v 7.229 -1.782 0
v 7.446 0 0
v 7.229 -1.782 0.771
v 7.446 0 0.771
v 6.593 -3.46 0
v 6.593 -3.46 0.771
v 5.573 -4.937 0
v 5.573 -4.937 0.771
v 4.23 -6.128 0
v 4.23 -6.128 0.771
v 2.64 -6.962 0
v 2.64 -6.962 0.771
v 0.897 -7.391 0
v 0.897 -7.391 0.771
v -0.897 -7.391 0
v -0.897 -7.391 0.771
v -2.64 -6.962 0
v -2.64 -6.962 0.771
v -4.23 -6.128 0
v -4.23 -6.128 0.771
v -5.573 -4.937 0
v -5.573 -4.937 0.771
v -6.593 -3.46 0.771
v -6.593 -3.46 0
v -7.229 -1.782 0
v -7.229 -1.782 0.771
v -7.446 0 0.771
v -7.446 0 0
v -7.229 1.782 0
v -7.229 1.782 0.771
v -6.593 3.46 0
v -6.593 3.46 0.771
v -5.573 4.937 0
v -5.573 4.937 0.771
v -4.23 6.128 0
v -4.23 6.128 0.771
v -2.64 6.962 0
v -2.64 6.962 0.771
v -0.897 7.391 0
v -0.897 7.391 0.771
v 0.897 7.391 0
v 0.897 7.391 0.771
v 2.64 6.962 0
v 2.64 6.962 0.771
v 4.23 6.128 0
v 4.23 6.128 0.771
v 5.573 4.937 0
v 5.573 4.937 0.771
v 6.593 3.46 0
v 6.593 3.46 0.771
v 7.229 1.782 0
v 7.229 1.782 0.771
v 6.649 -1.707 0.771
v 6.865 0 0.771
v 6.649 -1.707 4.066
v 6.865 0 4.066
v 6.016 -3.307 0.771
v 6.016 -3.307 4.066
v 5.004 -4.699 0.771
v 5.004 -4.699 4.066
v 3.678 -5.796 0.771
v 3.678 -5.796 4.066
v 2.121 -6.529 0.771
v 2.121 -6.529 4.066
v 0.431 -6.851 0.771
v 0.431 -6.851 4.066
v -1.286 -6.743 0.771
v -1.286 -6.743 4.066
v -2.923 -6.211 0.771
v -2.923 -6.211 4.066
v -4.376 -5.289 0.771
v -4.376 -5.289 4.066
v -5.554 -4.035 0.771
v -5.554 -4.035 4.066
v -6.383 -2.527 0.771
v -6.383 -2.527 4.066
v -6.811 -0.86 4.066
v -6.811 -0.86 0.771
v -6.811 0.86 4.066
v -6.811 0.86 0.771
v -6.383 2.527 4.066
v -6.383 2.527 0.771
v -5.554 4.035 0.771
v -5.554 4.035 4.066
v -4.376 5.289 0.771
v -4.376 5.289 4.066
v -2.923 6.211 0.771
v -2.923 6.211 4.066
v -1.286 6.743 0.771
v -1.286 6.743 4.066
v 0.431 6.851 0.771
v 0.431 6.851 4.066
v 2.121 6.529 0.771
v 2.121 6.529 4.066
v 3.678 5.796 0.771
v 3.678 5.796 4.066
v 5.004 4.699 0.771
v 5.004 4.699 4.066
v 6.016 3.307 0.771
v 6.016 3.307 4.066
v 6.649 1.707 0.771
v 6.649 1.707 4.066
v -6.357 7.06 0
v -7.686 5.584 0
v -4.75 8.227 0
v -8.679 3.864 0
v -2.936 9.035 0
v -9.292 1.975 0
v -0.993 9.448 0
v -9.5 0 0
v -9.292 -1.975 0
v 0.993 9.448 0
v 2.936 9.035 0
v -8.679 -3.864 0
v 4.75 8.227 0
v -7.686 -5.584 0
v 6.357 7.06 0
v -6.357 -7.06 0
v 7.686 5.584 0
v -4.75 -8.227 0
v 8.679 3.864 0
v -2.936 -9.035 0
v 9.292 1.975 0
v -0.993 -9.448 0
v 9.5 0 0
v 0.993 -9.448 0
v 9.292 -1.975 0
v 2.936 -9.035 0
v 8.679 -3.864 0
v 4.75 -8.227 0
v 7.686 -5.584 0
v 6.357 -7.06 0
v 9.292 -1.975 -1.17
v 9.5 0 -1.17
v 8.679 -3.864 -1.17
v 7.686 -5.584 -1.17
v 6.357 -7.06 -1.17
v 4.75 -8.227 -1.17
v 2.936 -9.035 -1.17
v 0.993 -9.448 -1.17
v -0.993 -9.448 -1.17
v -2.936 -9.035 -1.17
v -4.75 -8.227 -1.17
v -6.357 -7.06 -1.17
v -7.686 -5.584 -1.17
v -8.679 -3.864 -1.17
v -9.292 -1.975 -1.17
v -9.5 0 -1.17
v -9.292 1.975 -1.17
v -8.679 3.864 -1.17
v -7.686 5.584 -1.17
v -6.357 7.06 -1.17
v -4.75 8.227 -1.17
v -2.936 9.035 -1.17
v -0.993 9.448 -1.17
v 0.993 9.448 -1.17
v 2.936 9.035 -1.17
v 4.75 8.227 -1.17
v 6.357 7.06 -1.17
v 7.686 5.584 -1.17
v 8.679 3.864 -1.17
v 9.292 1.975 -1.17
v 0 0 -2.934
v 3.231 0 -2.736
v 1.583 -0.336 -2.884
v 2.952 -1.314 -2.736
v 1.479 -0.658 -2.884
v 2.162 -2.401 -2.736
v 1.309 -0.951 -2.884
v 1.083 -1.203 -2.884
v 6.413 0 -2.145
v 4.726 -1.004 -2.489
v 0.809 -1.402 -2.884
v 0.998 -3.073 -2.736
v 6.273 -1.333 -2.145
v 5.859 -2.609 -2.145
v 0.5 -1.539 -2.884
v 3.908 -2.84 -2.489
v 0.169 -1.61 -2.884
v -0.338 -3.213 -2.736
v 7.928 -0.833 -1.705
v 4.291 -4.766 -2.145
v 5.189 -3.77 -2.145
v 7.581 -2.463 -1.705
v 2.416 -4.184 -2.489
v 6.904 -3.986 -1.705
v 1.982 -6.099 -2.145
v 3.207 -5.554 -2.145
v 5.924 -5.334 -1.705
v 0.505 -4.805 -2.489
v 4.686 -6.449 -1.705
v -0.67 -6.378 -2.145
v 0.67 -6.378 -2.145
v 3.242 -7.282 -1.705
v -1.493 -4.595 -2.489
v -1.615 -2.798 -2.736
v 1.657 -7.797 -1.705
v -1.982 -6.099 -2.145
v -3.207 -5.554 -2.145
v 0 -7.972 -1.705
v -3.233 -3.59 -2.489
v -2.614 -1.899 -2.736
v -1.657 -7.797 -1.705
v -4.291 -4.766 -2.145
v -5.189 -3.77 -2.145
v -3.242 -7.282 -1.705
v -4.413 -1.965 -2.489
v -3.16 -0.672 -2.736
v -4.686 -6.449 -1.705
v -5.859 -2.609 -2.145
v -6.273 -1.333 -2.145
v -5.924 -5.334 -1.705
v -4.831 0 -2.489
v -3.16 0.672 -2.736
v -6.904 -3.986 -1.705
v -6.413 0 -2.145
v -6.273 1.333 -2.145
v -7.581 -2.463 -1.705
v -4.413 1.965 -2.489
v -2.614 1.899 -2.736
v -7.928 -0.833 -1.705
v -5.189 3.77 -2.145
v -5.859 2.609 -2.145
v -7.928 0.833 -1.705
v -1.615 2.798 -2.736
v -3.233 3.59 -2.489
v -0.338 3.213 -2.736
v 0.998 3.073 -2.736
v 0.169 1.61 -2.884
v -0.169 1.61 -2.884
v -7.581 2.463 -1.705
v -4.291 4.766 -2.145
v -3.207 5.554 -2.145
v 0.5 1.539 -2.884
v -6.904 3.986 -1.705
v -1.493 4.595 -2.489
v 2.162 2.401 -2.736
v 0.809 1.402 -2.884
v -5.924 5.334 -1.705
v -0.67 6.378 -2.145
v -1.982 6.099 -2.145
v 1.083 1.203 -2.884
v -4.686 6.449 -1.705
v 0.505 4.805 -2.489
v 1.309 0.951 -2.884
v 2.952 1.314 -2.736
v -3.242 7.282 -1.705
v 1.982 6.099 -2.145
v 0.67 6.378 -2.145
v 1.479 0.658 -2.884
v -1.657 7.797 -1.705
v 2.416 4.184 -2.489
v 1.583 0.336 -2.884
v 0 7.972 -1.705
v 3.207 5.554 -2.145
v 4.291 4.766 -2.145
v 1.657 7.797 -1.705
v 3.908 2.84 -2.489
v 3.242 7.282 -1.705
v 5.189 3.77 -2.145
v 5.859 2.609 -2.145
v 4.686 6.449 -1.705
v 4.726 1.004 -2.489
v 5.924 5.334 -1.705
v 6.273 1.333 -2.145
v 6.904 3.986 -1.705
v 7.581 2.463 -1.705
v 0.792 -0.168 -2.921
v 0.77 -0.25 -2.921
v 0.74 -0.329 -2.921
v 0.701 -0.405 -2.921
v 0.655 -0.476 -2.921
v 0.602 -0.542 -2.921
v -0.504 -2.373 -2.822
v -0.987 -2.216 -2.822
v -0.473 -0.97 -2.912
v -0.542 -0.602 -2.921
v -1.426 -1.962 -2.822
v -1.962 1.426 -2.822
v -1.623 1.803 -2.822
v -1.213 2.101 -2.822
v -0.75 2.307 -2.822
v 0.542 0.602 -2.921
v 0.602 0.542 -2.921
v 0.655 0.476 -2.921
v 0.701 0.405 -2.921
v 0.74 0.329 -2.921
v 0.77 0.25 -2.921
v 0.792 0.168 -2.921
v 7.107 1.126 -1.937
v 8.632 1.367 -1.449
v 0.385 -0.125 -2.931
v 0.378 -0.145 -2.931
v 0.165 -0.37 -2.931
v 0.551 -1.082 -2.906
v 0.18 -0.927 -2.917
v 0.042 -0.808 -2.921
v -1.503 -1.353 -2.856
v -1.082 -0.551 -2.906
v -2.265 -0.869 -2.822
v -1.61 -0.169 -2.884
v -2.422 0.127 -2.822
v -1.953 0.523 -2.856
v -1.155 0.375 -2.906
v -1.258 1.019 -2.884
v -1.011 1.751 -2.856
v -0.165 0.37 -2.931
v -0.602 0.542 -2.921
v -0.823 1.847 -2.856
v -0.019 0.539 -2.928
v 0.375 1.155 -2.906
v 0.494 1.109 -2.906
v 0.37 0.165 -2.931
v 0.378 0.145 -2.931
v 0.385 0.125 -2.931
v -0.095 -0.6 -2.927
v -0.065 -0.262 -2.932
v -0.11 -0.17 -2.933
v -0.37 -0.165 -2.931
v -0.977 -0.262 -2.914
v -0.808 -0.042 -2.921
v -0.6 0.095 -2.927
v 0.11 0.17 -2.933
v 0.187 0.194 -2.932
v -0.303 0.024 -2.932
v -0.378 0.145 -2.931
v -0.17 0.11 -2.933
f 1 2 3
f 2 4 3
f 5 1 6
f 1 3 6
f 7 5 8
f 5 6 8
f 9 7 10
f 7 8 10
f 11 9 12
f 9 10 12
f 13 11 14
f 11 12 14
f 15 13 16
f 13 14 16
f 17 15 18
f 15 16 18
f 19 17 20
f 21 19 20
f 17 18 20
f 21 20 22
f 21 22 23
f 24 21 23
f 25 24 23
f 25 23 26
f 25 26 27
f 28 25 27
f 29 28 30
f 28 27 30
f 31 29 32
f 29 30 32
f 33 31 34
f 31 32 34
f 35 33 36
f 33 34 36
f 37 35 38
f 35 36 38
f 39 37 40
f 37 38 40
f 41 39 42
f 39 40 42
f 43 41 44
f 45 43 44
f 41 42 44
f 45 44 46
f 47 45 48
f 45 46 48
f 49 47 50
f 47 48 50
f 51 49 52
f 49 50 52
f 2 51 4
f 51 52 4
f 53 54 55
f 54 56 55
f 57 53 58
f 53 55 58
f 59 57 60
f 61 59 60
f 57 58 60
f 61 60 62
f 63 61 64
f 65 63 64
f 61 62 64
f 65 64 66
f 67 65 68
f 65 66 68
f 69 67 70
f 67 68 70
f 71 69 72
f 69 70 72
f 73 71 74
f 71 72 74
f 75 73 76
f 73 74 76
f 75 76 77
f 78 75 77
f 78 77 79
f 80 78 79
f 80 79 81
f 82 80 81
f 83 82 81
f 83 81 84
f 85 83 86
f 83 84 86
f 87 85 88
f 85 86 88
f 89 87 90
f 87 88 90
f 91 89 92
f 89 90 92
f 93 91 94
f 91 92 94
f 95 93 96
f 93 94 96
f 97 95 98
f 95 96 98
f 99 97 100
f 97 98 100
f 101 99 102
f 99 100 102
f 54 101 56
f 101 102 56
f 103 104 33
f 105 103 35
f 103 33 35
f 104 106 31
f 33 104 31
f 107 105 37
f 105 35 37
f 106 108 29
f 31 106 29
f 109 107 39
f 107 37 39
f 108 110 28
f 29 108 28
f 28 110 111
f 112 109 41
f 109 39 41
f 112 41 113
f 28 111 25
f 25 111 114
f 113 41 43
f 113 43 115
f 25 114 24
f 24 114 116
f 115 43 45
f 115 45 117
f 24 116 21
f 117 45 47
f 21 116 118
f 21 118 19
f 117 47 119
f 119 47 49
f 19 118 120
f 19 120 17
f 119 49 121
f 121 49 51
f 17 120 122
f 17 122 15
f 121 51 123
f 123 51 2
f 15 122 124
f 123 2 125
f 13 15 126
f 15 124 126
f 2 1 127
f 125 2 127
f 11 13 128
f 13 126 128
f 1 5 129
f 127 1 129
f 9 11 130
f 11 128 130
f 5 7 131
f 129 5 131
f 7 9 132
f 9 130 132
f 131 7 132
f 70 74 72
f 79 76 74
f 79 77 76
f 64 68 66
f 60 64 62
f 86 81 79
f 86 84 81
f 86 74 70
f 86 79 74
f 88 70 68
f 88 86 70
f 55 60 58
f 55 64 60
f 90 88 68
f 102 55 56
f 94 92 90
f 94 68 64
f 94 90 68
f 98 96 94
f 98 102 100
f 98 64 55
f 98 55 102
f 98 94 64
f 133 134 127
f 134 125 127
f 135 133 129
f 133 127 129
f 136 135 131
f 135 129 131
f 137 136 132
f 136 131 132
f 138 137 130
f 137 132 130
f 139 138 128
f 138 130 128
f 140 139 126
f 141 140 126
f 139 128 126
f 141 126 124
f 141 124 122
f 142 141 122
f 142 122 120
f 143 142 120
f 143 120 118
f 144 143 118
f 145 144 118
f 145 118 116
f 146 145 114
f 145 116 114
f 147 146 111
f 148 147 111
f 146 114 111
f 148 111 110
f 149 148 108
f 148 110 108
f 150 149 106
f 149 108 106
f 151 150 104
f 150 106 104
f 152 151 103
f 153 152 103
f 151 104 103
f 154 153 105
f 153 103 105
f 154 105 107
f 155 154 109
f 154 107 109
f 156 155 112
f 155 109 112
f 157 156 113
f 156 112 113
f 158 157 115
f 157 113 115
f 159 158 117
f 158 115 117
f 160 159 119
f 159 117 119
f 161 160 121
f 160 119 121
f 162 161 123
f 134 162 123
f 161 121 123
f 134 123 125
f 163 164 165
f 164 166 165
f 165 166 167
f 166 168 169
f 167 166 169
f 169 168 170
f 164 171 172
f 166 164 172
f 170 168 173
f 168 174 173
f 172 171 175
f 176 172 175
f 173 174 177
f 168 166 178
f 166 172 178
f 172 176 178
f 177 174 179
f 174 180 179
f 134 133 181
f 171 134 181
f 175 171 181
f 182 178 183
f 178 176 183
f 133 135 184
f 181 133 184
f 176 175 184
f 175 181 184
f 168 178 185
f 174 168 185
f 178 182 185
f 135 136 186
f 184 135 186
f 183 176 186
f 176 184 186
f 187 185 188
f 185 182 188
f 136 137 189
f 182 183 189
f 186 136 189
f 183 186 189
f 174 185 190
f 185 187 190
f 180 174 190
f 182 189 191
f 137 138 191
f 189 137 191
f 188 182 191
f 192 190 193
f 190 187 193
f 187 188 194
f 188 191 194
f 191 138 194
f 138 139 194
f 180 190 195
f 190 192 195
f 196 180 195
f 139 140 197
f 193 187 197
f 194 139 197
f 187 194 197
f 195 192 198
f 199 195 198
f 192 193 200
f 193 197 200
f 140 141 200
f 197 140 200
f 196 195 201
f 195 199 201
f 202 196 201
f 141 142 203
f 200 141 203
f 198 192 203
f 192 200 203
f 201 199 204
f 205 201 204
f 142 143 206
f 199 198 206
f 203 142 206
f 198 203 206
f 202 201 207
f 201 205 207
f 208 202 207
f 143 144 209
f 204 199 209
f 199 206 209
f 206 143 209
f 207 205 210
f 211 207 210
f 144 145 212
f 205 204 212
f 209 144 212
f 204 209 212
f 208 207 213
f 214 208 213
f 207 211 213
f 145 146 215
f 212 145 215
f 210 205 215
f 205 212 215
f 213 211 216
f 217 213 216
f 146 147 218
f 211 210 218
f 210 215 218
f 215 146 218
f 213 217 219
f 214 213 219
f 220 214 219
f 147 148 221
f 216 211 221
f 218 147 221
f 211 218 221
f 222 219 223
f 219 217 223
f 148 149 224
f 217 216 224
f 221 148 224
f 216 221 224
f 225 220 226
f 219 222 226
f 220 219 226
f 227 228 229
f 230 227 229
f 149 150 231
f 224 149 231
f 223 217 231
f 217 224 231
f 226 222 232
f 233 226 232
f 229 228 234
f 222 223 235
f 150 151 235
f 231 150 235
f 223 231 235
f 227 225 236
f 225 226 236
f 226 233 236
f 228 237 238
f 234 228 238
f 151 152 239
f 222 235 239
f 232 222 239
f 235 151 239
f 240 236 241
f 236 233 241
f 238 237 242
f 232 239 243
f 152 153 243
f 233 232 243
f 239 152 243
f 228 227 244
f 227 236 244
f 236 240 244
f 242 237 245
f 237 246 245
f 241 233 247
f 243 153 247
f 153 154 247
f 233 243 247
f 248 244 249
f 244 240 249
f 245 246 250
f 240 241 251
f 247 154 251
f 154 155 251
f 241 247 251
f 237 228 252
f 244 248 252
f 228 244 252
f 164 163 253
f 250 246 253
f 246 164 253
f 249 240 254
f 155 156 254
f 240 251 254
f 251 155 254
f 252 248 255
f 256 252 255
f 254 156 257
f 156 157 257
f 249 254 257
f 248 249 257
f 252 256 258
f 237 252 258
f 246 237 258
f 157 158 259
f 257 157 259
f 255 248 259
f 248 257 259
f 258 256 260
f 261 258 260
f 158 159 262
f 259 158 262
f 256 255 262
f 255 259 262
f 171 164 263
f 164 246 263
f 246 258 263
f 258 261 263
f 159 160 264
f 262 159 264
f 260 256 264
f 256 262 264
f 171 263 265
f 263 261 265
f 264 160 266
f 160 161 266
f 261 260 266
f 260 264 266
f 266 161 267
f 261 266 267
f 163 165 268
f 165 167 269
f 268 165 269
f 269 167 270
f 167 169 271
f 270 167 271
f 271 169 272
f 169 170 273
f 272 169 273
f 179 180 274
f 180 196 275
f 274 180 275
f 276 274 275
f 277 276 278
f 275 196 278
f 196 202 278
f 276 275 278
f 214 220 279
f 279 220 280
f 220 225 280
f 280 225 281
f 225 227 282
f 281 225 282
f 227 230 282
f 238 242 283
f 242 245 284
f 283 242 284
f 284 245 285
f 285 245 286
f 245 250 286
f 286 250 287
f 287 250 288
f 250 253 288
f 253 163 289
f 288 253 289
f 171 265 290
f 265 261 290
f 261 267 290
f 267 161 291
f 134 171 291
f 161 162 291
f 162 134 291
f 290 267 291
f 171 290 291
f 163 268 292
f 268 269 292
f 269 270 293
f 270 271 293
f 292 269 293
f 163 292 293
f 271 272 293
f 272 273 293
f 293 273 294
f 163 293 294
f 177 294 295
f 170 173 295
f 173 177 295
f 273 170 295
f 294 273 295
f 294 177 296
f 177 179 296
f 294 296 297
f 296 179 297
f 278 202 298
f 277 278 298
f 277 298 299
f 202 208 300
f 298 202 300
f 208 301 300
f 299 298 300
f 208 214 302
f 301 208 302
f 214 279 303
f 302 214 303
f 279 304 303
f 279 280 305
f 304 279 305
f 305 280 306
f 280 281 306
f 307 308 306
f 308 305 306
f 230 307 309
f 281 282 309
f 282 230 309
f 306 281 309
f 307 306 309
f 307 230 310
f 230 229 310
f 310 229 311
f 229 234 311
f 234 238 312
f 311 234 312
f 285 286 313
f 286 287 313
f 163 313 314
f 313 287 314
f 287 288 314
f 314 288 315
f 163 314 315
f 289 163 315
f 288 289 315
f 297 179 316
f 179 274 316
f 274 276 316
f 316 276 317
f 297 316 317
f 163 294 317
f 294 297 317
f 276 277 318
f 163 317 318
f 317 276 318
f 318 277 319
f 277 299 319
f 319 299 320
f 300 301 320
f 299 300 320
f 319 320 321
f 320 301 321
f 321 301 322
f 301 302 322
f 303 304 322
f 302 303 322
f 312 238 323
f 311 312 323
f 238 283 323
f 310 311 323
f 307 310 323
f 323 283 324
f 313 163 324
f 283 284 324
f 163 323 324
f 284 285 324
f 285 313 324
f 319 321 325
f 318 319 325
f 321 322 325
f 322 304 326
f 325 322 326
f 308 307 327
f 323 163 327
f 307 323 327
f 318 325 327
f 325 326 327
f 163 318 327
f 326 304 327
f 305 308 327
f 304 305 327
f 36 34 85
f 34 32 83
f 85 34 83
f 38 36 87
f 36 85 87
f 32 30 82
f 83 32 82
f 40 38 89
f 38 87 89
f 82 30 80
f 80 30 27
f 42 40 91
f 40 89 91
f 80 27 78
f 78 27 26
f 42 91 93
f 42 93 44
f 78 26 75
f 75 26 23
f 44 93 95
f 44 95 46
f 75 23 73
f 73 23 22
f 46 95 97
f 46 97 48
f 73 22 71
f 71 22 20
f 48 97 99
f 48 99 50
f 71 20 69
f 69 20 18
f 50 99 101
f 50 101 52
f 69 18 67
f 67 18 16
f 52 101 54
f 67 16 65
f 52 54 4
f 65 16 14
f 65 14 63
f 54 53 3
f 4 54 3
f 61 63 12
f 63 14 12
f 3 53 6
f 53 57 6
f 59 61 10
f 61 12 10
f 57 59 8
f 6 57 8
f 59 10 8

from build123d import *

# Parameters (mm, degrees)
SKETCH6_R          = 6.864817117
CUT_EXTRUDE2_DEPTH = 3.3
SKETCH5_R          = 15.702559167
CUT_EXTRUDE3_DEPTH = 40


with BuildPart() as part:
    # Sketch1 → Revolve2 (revolve)
    with BuildSketch(Plane(origin=(0, 0, 0), x_dir=(0, 0, -1), z_dir=(1, 0, 0))):
        with BuildLine():
            Line((1.771e-06, 9.5), (1.771e-06, 7.445611339))
            Line((1.771e-06, 7.445611339), (-0.771464581, 7.445611339))
            Line((-0.771464581, 7.445611339), (-0.771464581, 6.864817117))
            Line((-0.771464581, 6.864817117), (-4.066354879, 6.864817117))
            Line((-4.066354879, 6.864817117), (-4.066354879, 8.484339467))
            Line((-4.066354879, 8.484339467), (-4.975618005, 9.546154997))
            Line((-4.975618005, 9.546154997), (-7.06424338, 9.546154997))
            Line((-7.06424338, 9.546154997), (-7.767897919, 10.954193429))
            Line((-7.767897919, 10.954193429), (-9.164037876, 10.954193429))
            Line((-9.164037876, 10.954193429), (-9.945876251, 9.546154997))
            Line((-9.945876251, 9.546154997), (-9.945876251, 8))
            Line((-9.945876251, 8), (-19.896053439, 8))
            Line((-19.896053439, 8), (-20.566354879, 7.426001631))
            Line((-20.566354879, 7.426001631), (-23.121440557, 7.426001631))
            Line((-23.121440557, 7.426001631), (-23.682625072, 6.864817117))
            Line((-23.682625072, 6.864817117), (-23.682625072, 6.383537324))
            Line((-23.682625072, 6.383537324), (-27.0133813, 6.383537324))
            Line((-27.0133813, 6.383537324), (-27.0133813, 5.464238658))
            Line((-27.0133813, 5.464238658), (-31.931960755, 5.464238658))
            Line((-31.931960755, 5.464238658), (-31.931960755, 1.447456583))
            Line((-31.931960755, 1.447456583), (-38.111348046, 1.447456583))
            Line((-38.111348046, 1.447456583), (-38.931960755, 1.037362766))
            Line((-38.931960755, 1.037362766), (-38.931960755, 0))
            Line((-38.931960755, 0), (2.933645121, 0))
            ThreePointArc((2.933645121, 0), (2.489100327, 4.831124101), (1.170397182, 9.5))
            Line((1.170397182, 9.5), (1.771e-06, 9.5))
        make_face()
    revolve(axis=Axis((0, 0, 38.931960755), (0, 0, -1)))


with BuildPart() as body_2:
    # Split1: the piece on the far side of the plane
    add(part.part)
    split(bisect_by=Plane(origin=(0, 6.864817117, 4.066354879), x_dir=(1, 0, 0), z_dir=(0, 0, 1)), keep=Keep.BOTTOM)


with BuildPart() as part_1:
    add(part.part)

    # Split1
    split(bisect_by=Plane(origin=(0, 6.864817117, 4.066354879), x_dir=(1, 0, 0), z_dir=(0, 0, 1)), keep=Keep.TOP)

    # Sketch6 → Cut-Extrude2 (cut)
    with BuildSketch(Plane(origin=(0, 0, 4.066354879), x_dir=(-1, 0, 0), z_dir=(0, 0, -1))):
        Circle(SKETCH6_R)
    extrude(amount=-CUT_EXTRUDE2_DEPTH, mode=Mode.SUBTRACT)

    # Sketch5 → Cut-Extrude3 (cut)
    with BuildSketch(Plane(origin=(0, 0, 4.066354879), x_dir=(-1, 0, 0), z_dir=(0, 0, -1))):
        Circle(SKETCH5_R)
    extrude(amount=-CUT_EXTRUDE3_DEPTH, mode=Mode.SUBTRACT)


solid = body_2.part
